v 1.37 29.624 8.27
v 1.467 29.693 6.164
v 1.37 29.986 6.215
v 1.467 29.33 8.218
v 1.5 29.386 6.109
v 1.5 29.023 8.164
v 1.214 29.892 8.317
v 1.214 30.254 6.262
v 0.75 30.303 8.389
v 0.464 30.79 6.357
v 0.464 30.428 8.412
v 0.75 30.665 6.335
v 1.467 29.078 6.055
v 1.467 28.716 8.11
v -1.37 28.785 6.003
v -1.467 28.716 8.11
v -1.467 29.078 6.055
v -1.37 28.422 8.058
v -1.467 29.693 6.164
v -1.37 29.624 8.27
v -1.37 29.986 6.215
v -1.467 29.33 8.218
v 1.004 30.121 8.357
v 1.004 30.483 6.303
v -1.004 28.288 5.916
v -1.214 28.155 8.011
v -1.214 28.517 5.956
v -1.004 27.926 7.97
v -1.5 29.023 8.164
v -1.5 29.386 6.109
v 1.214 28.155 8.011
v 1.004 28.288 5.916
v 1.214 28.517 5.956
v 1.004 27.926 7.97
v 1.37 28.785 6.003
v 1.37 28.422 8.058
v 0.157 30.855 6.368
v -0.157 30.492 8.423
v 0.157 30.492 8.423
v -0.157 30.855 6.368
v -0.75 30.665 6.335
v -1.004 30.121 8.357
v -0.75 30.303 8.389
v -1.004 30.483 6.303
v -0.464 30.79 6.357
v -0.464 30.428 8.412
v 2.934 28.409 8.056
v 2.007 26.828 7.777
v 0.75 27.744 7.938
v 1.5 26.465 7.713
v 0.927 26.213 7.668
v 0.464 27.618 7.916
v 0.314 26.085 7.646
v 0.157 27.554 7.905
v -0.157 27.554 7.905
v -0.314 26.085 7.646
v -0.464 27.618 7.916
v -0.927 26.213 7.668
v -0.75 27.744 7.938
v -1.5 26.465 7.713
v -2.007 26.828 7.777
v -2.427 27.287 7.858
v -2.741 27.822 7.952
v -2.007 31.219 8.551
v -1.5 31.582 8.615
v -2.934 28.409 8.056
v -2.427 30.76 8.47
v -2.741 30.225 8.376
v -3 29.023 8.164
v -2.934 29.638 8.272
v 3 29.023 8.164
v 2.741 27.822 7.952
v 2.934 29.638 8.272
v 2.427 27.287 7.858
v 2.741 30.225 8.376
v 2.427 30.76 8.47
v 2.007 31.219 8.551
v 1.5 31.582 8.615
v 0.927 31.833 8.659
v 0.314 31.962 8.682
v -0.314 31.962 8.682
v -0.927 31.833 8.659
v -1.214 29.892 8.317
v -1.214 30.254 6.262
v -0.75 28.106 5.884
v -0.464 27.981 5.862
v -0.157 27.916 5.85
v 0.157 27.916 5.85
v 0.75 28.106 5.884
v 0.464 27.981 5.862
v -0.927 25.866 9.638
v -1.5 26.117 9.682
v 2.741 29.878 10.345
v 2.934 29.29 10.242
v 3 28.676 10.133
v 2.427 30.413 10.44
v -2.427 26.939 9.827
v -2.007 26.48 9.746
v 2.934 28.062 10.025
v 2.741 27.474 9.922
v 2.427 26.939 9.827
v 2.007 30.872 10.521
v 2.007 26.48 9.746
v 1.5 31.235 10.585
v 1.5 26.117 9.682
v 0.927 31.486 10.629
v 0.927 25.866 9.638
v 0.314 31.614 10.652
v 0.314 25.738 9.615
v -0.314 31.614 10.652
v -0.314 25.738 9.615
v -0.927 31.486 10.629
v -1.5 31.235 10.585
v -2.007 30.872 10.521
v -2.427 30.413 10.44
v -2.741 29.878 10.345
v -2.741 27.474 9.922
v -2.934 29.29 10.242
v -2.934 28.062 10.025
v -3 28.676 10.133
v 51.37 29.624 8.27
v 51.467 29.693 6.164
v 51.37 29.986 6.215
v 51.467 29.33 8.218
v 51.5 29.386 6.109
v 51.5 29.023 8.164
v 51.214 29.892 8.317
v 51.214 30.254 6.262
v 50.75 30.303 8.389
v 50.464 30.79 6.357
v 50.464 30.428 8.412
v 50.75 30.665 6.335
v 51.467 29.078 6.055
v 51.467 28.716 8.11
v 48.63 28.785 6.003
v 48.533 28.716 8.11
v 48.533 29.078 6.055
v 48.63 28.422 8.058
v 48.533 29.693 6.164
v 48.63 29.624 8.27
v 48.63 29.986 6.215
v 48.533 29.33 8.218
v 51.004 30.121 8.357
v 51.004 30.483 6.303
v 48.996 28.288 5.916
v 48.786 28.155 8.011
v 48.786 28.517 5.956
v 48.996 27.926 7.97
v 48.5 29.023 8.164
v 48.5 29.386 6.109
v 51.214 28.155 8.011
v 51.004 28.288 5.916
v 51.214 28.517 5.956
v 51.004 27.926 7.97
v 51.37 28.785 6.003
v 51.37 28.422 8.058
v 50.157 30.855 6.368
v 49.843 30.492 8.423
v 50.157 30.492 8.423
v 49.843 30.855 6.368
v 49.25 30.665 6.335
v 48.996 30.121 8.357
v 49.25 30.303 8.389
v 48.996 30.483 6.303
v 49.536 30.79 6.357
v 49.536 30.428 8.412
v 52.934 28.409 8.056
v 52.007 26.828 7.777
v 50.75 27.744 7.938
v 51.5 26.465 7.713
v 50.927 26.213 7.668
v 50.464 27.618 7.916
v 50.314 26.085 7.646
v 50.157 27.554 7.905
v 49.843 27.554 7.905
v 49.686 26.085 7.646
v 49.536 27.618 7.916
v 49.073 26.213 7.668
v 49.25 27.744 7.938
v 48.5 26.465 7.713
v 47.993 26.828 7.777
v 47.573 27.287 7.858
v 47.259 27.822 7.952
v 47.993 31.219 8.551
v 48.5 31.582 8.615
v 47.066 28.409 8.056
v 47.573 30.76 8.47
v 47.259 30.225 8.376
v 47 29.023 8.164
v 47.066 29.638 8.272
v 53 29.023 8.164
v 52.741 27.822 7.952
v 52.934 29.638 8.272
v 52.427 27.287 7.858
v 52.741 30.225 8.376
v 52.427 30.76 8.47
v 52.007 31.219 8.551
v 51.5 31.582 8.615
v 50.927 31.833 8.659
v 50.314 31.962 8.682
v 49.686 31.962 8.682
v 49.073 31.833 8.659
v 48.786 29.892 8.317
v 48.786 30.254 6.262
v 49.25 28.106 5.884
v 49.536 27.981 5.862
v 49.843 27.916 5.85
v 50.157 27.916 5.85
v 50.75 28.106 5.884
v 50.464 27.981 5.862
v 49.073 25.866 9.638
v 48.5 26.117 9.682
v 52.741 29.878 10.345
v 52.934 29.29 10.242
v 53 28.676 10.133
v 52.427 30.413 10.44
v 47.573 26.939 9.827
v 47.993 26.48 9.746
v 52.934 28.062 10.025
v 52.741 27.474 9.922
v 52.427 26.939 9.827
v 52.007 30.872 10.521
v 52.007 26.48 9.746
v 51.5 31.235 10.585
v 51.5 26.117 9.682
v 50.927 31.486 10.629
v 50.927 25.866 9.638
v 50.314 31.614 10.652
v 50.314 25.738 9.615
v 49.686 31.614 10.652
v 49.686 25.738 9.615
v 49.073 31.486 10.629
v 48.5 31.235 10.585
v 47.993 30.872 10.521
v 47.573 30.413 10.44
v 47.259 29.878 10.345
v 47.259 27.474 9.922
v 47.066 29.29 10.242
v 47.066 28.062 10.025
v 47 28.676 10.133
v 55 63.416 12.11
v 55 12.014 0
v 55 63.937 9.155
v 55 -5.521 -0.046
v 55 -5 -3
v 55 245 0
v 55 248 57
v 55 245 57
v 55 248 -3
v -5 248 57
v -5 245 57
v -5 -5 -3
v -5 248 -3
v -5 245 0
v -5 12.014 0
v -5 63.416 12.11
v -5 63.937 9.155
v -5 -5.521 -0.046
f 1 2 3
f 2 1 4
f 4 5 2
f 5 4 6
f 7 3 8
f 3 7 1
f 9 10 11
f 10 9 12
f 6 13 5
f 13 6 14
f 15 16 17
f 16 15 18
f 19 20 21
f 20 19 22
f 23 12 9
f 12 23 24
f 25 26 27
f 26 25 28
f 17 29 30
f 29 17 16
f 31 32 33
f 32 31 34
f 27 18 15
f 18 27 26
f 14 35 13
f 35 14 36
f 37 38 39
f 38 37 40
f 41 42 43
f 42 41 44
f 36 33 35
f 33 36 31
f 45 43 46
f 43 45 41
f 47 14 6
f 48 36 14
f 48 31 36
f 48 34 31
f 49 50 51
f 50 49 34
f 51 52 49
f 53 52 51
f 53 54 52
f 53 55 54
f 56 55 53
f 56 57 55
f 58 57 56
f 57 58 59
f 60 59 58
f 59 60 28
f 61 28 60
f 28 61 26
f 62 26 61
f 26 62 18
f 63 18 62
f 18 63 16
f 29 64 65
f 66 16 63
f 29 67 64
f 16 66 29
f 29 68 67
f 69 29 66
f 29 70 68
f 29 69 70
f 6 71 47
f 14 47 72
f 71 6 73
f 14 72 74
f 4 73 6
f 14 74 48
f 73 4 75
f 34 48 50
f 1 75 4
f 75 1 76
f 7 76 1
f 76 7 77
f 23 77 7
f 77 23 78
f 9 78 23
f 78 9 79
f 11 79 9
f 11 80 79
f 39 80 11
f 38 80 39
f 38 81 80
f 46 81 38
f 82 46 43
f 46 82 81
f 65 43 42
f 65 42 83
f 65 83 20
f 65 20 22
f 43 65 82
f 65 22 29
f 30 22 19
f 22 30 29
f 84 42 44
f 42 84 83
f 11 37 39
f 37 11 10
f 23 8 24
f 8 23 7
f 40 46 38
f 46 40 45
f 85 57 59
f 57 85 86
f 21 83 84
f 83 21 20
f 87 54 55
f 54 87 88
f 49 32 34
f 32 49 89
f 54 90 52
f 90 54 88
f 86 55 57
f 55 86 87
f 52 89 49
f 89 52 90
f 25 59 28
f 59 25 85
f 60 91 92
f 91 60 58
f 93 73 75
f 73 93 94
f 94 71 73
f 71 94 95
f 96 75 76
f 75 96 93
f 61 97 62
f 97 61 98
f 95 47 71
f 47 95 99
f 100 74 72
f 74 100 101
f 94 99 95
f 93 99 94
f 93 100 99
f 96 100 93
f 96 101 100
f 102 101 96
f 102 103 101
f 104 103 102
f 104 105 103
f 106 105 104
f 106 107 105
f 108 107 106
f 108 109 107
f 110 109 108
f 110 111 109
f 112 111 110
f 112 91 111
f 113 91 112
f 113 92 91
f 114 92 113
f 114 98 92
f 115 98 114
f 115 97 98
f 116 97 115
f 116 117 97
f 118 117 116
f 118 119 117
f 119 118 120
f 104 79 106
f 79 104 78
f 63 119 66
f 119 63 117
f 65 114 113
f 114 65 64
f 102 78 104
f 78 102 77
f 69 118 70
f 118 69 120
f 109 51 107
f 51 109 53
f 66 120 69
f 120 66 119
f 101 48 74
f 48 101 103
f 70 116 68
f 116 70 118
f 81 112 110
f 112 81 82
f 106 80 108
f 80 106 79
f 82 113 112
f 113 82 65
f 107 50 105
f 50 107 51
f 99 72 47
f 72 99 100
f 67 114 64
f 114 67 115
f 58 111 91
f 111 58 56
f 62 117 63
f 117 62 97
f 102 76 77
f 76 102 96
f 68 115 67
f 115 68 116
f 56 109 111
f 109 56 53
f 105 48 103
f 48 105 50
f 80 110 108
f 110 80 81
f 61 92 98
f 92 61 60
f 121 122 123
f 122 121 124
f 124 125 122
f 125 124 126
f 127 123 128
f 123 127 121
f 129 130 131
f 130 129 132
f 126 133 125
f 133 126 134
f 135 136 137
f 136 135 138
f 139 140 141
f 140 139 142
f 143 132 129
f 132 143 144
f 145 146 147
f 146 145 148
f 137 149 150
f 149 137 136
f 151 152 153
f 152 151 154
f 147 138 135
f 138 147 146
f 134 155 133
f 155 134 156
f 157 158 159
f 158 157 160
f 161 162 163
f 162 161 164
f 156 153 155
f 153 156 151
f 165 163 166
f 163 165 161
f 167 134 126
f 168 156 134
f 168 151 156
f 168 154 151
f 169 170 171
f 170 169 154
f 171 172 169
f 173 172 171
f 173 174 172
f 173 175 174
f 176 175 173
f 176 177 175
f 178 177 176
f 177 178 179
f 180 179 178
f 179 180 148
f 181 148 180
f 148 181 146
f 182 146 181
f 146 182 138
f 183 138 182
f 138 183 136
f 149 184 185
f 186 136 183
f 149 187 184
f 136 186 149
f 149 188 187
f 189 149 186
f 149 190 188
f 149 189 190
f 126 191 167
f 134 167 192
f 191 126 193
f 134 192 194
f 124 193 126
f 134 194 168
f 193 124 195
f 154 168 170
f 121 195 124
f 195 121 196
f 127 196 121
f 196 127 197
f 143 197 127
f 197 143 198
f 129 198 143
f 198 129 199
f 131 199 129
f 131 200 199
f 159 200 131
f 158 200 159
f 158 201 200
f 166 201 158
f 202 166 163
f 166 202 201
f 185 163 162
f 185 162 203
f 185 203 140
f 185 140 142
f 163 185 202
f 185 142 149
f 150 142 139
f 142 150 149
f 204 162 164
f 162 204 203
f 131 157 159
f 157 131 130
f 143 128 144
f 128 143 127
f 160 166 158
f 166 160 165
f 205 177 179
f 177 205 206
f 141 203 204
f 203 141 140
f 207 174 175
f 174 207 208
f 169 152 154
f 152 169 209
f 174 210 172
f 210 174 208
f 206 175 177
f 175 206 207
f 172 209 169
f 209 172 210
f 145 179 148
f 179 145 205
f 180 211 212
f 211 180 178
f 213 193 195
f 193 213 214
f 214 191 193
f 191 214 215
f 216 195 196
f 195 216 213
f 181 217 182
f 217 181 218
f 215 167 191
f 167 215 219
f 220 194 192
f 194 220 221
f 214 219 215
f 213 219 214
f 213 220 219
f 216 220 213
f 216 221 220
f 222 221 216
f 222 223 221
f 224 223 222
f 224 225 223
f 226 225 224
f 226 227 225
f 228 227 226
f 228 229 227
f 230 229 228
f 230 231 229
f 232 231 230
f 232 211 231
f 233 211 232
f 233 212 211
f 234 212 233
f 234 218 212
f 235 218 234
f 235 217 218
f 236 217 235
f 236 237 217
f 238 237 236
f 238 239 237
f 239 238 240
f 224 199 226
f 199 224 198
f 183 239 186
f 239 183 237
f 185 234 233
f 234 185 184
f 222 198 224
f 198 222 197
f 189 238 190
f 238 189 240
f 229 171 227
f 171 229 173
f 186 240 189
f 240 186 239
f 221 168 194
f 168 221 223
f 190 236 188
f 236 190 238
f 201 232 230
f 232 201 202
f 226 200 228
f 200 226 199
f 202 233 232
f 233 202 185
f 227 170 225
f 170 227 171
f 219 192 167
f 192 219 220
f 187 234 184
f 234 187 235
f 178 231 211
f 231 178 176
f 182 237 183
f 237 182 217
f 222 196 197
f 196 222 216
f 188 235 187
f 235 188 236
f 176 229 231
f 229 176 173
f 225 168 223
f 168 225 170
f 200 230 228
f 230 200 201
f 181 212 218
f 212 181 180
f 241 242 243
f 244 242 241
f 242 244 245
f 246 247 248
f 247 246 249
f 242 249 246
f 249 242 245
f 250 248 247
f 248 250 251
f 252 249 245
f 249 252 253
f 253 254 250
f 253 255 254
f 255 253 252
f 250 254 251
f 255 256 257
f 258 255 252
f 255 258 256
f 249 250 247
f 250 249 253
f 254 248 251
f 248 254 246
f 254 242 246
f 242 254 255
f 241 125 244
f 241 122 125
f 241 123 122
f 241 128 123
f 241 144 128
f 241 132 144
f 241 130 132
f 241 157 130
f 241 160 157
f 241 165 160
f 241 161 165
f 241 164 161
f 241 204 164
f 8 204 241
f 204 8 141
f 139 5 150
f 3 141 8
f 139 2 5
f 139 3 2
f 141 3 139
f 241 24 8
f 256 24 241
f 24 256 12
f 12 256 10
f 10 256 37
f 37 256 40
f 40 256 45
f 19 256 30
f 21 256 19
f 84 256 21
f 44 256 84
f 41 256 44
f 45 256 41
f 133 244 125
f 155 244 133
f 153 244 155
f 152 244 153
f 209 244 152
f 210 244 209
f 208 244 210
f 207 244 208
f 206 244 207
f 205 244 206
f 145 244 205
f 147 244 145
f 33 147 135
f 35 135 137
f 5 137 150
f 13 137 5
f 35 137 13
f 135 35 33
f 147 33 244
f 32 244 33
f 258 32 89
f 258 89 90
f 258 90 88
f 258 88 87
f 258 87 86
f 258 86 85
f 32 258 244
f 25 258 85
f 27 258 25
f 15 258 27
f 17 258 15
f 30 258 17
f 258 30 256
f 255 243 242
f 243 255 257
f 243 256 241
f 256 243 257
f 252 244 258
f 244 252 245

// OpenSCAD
$fn=30;

translate([-5,-5+250,-3])
cube([60,3, 60]);

translate([-5,-5,-3])
cube([60,250, 3]);

translate([-5,-5,-3])
rotate([10,0,0])
cube([60,70, 3]);

rotate([10,0,0]){
translate([0,30,0])
post();

translate([50,30,0])
post();
}

module v_post(){
translate([30,0,0])
post();

translate([30,50,0])
post();
}

module post() {
cylinder(3, 3/2, 3/2);
translate([0,0,3])
cylinder(2, 6/2, 6/2);
}
